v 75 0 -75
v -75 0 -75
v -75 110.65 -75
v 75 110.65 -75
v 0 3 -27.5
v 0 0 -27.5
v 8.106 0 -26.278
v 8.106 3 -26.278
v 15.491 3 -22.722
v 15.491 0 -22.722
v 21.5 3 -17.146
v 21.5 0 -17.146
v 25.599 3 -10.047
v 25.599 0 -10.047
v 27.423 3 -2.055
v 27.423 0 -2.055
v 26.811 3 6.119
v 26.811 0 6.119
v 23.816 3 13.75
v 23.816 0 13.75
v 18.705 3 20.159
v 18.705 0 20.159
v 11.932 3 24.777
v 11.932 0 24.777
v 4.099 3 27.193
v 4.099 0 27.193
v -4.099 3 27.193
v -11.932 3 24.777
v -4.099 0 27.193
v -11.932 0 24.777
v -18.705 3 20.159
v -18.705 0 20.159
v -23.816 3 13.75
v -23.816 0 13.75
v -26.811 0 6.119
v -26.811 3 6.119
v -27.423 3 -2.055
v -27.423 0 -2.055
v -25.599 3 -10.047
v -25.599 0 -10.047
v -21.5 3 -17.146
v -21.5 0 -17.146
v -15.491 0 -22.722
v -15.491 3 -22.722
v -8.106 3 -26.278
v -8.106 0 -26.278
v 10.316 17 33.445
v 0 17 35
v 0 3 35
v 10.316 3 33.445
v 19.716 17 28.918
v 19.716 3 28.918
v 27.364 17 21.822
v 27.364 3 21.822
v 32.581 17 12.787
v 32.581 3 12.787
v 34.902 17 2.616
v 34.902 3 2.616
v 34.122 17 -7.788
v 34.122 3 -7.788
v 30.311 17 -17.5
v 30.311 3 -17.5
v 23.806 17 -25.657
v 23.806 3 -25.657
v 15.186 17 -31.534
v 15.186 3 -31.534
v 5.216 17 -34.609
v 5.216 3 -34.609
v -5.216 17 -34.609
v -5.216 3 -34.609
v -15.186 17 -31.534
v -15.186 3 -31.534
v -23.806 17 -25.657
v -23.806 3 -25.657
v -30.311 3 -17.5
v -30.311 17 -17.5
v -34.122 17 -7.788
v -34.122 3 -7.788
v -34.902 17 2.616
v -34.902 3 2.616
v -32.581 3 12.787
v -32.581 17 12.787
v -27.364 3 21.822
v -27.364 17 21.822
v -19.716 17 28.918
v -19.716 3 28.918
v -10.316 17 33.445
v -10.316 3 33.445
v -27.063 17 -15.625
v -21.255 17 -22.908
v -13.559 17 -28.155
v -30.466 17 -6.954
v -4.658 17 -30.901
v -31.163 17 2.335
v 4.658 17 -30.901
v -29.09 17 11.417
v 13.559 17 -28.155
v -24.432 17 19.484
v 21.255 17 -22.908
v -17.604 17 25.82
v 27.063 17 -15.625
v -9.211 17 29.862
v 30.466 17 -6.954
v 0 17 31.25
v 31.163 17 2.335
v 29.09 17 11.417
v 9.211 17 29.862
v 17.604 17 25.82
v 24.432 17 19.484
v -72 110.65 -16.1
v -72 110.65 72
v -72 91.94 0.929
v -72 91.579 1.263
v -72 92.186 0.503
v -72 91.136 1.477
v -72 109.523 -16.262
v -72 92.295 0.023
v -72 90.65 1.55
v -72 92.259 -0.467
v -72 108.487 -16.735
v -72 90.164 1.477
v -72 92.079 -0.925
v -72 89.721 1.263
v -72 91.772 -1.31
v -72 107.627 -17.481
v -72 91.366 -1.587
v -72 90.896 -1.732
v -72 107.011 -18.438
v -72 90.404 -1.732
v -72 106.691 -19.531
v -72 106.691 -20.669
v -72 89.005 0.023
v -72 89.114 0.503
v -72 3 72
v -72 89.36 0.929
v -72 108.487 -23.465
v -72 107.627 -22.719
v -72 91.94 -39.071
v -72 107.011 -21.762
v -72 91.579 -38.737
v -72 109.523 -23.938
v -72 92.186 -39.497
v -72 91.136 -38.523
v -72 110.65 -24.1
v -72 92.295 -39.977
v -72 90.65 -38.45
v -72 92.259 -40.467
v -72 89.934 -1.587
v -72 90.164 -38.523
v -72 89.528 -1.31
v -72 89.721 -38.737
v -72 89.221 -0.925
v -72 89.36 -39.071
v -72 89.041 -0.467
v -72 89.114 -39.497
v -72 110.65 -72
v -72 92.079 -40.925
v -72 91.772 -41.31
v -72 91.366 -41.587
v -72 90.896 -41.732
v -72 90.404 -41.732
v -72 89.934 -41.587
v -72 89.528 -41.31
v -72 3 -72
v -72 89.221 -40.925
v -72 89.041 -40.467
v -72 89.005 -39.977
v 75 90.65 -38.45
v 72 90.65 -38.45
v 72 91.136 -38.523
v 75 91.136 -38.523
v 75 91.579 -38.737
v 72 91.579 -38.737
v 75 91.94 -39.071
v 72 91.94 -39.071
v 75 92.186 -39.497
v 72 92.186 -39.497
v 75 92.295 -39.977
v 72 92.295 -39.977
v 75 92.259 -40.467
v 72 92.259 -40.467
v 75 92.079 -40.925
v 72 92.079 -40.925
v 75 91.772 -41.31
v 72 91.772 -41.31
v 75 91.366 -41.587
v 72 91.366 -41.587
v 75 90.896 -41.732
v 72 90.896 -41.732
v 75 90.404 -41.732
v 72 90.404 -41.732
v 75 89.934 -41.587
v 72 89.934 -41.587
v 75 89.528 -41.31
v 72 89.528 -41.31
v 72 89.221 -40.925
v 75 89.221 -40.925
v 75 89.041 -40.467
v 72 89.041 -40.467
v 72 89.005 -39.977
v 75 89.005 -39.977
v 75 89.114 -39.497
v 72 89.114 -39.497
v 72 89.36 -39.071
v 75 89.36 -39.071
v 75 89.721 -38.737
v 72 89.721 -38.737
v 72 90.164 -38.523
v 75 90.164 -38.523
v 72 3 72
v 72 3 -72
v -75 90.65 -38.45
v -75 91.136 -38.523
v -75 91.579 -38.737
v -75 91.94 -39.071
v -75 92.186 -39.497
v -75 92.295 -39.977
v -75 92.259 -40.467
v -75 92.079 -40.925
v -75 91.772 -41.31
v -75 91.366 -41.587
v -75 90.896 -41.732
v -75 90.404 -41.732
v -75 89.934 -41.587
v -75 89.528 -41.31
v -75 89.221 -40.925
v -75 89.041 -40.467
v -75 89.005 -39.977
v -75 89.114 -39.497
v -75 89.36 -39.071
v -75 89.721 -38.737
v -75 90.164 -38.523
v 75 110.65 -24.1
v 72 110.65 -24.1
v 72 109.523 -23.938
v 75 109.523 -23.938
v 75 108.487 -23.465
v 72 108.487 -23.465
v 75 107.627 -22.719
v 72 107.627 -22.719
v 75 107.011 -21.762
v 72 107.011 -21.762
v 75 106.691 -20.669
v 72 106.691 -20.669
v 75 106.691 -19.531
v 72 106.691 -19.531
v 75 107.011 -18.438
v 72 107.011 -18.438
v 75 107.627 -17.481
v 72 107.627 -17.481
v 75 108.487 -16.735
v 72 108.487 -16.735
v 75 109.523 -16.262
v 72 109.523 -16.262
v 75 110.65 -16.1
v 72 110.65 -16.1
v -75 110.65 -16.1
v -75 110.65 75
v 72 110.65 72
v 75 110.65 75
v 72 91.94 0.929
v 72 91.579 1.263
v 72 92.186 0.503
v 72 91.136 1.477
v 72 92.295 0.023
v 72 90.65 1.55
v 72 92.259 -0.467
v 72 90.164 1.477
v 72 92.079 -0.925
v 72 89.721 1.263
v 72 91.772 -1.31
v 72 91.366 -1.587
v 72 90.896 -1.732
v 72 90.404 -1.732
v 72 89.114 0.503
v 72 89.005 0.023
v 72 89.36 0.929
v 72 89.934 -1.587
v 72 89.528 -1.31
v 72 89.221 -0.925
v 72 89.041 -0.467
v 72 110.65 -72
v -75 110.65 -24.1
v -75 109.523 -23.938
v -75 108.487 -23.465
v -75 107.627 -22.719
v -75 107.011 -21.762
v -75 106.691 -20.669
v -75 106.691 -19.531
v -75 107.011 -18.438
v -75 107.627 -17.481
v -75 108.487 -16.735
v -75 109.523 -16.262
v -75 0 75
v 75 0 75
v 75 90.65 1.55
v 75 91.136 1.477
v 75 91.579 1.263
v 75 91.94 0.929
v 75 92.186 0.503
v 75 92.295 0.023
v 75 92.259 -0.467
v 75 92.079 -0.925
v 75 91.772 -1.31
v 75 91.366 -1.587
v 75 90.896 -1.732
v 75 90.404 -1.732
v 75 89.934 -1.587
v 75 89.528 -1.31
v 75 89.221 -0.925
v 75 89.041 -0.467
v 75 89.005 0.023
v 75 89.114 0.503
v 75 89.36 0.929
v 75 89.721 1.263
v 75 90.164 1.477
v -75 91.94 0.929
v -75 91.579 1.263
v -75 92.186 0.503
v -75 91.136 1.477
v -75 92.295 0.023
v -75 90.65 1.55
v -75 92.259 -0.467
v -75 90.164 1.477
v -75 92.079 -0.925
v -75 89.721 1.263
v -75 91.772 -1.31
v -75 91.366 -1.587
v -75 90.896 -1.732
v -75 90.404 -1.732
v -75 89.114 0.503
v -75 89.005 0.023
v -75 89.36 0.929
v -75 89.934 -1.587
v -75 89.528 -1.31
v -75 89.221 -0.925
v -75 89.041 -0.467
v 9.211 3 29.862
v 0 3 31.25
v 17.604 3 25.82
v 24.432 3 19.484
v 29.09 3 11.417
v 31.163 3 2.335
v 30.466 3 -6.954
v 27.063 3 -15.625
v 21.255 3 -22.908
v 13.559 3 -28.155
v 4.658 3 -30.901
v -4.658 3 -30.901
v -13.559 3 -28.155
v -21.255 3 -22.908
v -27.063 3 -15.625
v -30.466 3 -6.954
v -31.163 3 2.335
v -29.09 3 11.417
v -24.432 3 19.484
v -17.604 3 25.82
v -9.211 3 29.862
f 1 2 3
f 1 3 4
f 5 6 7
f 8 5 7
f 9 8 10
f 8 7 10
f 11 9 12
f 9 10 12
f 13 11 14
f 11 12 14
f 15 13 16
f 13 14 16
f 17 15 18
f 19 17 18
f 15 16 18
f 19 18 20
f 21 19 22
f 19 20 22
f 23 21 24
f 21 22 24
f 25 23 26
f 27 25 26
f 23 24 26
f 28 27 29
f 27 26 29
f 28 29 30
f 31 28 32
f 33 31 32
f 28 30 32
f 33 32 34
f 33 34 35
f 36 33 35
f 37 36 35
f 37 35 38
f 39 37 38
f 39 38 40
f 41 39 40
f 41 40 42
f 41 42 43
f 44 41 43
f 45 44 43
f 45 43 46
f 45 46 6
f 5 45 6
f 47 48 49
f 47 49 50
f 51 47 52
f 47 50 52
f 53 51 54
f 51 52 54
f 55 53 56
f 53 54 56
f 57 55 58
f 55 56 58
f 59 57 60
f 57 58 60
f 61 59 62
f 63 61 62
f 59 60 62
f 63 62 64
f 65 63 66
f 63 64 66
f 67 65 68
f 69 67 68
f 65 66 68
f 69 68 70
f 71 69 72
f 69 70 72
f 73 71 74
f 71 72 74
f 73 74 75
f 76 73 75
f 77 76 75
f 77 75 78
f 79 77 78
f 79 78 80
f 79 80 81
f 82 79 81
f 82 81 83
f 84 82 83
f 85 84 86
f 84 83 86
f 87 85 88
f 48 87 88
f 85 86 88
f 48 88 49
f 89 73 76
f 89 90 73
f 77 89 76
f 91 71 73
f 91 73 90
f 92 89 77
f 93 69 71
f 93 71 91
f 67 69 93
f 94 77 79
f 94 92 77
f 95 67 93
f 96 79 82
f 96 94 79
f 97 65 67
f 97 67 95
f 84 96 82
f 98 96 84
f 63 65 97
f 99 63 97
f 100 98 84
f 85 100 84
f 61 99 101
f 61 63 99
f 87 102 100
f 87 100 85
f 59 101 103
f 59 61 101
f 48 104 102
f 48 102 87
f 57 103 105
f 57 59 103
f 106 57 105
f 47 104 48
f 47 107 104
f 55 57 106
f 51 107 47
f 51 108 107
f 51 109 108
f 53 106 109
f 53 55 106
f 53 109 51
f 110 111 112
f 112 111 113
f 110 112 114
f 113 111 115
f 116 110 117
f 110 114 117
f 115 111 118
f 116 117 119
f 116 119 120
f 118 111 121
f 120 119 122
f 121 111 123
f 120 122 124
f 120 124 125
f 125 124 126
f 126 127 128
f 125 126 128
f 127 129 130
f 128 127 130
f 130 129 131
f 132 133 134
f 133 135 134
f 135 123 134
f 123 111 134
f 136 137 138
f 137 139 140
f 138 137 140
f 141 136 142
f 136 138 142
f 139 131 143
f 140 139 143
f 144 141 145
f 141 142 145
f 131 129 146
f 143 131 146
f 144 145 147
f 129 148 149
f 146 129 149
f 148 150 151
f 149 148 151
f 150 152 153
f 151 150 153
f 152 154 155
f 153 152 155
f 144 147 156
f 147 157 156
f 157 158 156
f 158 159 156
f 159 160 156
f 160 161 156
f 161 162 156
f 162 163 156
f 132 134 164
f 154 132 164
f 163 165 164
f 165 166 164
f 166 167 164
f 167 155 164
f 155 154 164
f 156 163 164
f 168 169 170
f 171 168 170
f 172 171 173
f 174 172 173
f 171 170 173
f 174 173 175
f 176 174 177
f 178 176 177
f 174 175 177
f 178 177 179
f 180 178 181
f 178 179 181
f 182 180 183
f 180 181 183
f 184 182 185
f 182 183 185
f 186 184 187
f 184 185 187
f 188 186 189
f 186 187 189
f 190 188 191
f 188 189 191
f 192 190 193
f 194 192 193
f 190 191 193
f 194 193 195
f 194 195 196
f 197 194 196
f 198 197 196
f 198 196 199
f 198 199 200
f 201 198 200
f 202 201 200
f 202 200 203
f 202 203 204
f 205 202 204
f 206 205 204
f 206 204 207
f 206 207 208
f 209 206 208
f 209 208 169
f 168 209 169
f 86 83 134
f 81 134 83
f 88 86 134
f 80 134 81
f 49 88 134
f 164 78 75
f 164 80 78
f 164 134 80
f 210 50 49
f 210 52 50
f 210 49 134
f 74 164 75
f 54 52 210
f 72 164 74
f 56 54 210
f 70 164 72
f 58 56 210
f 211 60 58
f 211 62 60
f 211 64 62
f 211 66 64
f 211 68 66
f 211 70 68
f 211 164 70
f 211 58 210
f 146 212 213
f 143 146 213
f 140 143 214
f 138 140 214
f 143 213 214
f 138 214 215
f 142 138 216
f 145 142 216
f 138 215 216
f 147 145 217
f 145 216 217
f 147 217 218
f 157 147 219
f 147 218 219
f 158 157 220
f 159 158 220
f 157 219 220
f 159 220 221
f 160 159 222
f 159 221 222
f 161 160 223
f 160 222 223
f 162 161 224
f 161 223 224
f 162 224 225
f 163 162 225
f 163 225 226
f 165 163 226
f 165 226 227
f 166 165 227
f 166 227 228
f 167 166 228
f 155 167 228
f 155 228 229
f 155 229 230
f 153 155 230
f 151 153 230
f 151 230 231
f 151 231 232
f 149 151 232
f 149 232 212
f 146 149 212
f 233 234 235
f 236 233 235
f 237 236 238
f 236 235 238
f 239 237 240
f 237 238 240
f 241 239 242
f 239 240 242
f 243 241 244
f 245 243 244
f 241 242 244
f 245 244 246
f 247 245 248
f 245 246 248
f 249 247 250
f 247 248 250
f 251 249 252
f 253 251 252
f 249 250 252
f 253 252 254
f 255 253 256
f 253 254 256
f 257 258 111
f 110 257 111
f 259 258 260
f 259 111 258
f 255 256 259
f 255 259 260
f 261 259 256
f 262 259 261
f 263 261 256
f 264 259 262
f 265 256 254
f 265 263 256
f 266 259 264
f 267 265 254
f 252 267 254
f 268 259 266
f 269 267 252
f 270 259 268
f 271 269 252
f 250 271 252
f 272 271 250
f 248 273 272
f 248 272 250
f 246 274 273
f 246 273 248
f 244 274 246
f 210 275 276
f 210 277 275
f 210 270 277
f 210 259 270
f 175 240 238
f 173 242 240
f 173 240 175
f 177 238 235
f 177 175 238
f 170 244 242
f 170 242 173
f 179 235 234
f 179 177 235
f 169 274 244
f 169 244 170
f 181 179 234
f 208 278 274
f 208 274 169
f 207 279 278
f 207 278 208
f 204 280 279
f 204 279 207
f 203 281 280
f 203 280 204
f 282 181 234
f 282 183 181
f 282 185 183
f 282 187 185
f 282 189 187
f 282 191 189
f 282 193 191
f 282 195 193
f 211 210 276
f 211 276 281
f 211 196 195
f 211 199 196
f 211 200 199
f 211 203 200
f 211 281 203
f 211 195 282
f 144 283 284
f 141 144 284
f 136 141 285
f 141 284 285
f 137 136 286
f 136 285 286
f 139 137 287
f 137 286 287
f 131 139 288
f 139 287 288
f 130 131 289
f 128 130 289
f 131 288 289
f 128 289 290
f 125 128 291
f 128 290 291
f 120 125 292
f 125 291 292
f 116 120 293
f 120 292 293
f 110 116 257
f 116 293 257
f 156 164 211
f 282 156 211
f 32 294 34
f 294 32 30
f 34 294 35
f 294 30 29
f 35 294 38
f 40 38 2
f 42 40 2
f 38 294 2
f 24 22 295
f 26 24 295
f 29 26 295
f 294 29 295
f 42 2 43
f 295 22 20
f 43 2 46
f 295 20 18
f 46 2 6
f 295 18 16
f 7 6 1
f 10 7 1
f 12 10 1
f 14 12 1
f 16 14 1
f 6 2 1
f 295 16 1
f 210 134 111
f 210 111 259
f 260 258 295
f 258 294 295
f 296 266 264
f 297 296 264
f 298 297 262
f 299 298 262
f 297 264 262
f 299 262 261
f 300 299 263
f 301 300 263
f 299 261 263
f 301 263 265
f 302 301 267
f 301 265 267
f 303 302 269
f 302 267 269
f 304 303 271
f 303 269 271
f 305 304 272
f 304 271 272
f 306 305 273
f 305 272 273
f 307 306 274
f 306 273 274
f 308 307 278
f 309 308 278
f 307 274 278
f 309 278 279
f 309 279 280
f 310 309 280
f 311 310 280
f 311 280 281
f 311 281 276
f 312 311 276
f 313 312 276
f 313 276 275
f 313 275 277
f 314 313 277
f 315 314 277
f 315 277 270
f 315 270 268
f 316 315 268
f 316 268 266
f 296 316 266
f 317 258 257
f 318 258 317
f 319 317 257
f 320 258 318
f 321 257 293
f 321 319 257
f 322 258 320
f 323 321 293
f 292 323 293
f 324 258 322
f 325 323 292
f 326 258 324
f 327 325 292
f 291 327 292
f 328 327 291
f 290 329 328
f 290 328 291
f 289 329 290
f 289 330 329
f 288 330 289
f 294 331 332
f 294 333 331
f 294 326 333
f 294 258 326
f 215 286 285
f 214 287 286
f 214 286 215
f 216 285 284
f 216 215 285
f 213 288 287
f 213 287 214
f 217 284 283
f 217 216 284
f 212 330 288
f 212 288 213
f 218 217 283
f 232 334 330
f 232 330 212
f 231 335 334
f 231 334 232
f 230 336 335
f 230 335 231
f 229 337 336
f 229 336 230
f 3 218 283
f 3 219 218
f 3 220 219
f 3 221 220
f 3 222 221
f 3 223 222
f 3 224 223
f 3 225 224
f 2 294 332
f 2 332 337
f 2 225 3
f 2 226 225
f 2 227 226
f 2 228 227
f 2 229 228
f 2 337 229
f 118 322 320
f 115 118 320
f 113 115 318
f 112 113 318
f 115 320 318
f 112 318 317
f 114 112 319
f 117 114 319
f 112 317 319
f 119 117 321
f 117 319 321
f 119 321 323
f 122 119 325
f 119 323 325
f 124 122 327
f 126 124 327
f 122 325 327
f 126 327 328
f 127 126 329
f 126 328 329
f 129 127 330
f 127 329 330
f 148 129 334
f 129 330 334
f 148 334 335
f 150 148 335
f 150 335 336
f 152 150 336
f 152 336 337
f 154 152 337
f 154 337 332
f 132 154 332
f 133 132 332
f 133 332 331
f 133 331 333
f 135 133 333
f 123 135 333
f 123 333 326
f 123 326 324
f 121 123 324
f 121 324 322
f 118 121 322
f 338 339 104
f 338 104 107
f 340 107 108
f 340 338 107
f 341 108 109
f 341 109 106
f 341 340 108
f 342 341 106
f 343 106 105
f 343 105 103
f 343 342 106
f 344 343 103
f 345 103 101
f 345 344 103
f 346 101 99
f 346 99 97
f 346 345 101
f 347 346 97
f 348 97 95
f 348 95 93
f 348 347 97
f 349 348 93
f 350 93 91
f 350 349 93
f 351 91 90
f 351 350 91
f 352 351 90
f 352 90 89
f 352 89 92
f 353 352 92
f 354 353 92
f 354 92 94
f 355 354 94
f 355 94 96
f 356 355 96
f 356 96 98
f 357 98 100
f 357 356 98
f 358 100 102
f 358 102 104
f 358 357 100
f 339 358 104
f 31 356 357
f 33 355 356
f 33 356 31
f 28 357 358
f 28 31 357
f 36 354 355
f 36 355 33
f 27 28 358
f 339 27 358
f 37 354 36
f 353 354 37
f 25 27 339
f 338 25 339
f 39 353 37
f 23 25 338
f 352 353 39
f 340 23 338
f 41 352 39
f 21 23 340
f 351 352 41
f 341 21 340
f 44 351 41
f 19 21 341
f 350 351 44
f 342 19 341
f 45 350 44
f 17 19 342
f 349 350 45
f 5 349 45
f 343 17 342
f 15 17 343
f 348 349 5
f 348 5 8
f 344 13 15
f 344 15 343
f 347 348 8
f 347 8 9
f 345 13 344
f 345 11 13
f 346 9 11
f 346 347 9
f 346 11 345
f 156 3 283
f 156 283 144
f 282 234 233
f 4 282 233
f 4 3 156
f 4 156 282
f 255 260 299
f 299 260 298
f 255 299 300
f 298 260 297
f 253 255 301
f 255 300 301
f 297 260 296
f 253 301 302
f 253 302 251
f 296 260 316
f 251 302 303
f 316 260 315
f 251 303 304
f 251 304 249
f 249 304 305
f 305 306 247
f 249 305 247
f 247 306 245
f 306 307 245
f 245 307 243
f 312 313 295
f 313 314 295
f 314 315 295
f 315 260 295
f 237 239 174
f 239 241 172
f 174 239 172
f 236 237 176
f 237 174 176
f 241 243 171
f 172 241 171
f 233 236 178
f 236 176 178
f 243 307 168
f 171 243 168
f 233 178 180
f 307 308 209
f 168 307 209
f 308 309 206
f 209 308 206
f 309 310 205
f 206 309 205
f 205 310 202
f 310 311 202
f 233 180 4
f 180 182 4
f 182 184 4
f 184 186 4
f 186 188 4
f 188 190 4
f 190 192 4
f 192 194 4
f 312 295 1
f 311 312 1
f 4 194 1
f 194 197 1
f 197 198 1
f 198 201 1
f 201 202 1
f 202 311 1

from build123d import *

# Parameters (mm, degrees)
SKETCH_1_W          = 150
SKETCH_1_H          = 150
EXTRUDE_1_DEPTH     = 3
SKETCH_2_W          = 150
SKETCH_2_H          = 150
SKETCH_2_W_2        = 144
SKETCH_2_H_2        = 144
EXTRUDE_2_DEPTH     = 107.65
SKETCH_3_R          = 27.5
CUT_EXTRUDE_1_DEPTH = 91
SKETCH_4_R          = 4
CUT_EXTRUDE_2_DEPTH = 201.9189451
SKETCH_8_R          = 35
SKETCH_8_R_2        = 31.25
EXTRUDE_4_DEPTH     = 14
SKETCH_9_R          = 1.65
CUT_EXTRUDE_3_DEPTH = 201.9189451


with BuildPart() as part:
    # 草图1 → 凸台-拉伸1 (new body)
    with BuildSketch(Plane(origin=(0, 0, 0), x_dir=(1, 0, 0), z_dir=(0, 1, 0))):
        Rectangle(SKETCH_1_W, SKETCH_1_H)
    extrude(amount=EXTRUDE_1_DEPTH)

    # 草图2 → 凸台-拉伸2 (add)
    with BuildSketch(Plane(origin=(0, 3, 0), x_dir=(1, 0, 0), z_dir=(0, 1, 0))):
        Rectangle(SKETCH_2_W, SKETCH_2_H)
        Rectangle(SKETCH_2_W_2, SKETCH_2_H_2, mode=Mode.SUBTRACT)
    extrude(amount=EXTRUDE_2_DEPTH)

    # 草图3 → 切除-拉伸1 (cut)
    with BuildSketch(Plane.XZ):
        with Locations(Location((0, 0, 0), (0, 0, 270))):
            Circle(SKETCH_3_R)
    extrude(amount=-CUT_EXTRUDE_1_DEPTH, mode=Mode.SUBTRACT)

    # 草图4 → 切除-拉伸2 (cut, through all)
    with BuildSketch(Plane.ZY.offset(75)):
        with Locations((-20.1, 110.65)):
            Circle(SKETCH_4_R)
    extrude(amount=-CUT_EXTRUDE_2_DEPTH, mode=Mode.SUBTRACT)

    # 草图8 → 凸台-拉伸4 (add)
    with BuildSketch(Plane(origin=(0, 3, 0), x_dir=(1, 0, 0), z_dir=(0, 1, 0))):
        with Locations(Location((0, 0, 0), (0, 0, 270))):
            Circle(SKETCH_8_R)
        with Locations(Location((0, 0, 0), (0, 0, 270))):
            Circle(SKETCH_8_R_2, mode=Mode.SUBTRACT)
    extrude(amount=EXTRUDE_4_DEPTH)

    # 草图9 → 切除-拉伸3 (cut, through all)
    with BuildSketch(Plane.ZY.offset(75)):
        with Locations((-40.1, 90.65)):
            Circle(SKETCH_9_R)
        with Locations((-0.1, 90.65)):
            Circle(SKETCH_9_R)
    extrude(amount=-CUT_EXTRUDE_3_DEPTH, mode=Mode.SUBTRACT)


solid = part.part
